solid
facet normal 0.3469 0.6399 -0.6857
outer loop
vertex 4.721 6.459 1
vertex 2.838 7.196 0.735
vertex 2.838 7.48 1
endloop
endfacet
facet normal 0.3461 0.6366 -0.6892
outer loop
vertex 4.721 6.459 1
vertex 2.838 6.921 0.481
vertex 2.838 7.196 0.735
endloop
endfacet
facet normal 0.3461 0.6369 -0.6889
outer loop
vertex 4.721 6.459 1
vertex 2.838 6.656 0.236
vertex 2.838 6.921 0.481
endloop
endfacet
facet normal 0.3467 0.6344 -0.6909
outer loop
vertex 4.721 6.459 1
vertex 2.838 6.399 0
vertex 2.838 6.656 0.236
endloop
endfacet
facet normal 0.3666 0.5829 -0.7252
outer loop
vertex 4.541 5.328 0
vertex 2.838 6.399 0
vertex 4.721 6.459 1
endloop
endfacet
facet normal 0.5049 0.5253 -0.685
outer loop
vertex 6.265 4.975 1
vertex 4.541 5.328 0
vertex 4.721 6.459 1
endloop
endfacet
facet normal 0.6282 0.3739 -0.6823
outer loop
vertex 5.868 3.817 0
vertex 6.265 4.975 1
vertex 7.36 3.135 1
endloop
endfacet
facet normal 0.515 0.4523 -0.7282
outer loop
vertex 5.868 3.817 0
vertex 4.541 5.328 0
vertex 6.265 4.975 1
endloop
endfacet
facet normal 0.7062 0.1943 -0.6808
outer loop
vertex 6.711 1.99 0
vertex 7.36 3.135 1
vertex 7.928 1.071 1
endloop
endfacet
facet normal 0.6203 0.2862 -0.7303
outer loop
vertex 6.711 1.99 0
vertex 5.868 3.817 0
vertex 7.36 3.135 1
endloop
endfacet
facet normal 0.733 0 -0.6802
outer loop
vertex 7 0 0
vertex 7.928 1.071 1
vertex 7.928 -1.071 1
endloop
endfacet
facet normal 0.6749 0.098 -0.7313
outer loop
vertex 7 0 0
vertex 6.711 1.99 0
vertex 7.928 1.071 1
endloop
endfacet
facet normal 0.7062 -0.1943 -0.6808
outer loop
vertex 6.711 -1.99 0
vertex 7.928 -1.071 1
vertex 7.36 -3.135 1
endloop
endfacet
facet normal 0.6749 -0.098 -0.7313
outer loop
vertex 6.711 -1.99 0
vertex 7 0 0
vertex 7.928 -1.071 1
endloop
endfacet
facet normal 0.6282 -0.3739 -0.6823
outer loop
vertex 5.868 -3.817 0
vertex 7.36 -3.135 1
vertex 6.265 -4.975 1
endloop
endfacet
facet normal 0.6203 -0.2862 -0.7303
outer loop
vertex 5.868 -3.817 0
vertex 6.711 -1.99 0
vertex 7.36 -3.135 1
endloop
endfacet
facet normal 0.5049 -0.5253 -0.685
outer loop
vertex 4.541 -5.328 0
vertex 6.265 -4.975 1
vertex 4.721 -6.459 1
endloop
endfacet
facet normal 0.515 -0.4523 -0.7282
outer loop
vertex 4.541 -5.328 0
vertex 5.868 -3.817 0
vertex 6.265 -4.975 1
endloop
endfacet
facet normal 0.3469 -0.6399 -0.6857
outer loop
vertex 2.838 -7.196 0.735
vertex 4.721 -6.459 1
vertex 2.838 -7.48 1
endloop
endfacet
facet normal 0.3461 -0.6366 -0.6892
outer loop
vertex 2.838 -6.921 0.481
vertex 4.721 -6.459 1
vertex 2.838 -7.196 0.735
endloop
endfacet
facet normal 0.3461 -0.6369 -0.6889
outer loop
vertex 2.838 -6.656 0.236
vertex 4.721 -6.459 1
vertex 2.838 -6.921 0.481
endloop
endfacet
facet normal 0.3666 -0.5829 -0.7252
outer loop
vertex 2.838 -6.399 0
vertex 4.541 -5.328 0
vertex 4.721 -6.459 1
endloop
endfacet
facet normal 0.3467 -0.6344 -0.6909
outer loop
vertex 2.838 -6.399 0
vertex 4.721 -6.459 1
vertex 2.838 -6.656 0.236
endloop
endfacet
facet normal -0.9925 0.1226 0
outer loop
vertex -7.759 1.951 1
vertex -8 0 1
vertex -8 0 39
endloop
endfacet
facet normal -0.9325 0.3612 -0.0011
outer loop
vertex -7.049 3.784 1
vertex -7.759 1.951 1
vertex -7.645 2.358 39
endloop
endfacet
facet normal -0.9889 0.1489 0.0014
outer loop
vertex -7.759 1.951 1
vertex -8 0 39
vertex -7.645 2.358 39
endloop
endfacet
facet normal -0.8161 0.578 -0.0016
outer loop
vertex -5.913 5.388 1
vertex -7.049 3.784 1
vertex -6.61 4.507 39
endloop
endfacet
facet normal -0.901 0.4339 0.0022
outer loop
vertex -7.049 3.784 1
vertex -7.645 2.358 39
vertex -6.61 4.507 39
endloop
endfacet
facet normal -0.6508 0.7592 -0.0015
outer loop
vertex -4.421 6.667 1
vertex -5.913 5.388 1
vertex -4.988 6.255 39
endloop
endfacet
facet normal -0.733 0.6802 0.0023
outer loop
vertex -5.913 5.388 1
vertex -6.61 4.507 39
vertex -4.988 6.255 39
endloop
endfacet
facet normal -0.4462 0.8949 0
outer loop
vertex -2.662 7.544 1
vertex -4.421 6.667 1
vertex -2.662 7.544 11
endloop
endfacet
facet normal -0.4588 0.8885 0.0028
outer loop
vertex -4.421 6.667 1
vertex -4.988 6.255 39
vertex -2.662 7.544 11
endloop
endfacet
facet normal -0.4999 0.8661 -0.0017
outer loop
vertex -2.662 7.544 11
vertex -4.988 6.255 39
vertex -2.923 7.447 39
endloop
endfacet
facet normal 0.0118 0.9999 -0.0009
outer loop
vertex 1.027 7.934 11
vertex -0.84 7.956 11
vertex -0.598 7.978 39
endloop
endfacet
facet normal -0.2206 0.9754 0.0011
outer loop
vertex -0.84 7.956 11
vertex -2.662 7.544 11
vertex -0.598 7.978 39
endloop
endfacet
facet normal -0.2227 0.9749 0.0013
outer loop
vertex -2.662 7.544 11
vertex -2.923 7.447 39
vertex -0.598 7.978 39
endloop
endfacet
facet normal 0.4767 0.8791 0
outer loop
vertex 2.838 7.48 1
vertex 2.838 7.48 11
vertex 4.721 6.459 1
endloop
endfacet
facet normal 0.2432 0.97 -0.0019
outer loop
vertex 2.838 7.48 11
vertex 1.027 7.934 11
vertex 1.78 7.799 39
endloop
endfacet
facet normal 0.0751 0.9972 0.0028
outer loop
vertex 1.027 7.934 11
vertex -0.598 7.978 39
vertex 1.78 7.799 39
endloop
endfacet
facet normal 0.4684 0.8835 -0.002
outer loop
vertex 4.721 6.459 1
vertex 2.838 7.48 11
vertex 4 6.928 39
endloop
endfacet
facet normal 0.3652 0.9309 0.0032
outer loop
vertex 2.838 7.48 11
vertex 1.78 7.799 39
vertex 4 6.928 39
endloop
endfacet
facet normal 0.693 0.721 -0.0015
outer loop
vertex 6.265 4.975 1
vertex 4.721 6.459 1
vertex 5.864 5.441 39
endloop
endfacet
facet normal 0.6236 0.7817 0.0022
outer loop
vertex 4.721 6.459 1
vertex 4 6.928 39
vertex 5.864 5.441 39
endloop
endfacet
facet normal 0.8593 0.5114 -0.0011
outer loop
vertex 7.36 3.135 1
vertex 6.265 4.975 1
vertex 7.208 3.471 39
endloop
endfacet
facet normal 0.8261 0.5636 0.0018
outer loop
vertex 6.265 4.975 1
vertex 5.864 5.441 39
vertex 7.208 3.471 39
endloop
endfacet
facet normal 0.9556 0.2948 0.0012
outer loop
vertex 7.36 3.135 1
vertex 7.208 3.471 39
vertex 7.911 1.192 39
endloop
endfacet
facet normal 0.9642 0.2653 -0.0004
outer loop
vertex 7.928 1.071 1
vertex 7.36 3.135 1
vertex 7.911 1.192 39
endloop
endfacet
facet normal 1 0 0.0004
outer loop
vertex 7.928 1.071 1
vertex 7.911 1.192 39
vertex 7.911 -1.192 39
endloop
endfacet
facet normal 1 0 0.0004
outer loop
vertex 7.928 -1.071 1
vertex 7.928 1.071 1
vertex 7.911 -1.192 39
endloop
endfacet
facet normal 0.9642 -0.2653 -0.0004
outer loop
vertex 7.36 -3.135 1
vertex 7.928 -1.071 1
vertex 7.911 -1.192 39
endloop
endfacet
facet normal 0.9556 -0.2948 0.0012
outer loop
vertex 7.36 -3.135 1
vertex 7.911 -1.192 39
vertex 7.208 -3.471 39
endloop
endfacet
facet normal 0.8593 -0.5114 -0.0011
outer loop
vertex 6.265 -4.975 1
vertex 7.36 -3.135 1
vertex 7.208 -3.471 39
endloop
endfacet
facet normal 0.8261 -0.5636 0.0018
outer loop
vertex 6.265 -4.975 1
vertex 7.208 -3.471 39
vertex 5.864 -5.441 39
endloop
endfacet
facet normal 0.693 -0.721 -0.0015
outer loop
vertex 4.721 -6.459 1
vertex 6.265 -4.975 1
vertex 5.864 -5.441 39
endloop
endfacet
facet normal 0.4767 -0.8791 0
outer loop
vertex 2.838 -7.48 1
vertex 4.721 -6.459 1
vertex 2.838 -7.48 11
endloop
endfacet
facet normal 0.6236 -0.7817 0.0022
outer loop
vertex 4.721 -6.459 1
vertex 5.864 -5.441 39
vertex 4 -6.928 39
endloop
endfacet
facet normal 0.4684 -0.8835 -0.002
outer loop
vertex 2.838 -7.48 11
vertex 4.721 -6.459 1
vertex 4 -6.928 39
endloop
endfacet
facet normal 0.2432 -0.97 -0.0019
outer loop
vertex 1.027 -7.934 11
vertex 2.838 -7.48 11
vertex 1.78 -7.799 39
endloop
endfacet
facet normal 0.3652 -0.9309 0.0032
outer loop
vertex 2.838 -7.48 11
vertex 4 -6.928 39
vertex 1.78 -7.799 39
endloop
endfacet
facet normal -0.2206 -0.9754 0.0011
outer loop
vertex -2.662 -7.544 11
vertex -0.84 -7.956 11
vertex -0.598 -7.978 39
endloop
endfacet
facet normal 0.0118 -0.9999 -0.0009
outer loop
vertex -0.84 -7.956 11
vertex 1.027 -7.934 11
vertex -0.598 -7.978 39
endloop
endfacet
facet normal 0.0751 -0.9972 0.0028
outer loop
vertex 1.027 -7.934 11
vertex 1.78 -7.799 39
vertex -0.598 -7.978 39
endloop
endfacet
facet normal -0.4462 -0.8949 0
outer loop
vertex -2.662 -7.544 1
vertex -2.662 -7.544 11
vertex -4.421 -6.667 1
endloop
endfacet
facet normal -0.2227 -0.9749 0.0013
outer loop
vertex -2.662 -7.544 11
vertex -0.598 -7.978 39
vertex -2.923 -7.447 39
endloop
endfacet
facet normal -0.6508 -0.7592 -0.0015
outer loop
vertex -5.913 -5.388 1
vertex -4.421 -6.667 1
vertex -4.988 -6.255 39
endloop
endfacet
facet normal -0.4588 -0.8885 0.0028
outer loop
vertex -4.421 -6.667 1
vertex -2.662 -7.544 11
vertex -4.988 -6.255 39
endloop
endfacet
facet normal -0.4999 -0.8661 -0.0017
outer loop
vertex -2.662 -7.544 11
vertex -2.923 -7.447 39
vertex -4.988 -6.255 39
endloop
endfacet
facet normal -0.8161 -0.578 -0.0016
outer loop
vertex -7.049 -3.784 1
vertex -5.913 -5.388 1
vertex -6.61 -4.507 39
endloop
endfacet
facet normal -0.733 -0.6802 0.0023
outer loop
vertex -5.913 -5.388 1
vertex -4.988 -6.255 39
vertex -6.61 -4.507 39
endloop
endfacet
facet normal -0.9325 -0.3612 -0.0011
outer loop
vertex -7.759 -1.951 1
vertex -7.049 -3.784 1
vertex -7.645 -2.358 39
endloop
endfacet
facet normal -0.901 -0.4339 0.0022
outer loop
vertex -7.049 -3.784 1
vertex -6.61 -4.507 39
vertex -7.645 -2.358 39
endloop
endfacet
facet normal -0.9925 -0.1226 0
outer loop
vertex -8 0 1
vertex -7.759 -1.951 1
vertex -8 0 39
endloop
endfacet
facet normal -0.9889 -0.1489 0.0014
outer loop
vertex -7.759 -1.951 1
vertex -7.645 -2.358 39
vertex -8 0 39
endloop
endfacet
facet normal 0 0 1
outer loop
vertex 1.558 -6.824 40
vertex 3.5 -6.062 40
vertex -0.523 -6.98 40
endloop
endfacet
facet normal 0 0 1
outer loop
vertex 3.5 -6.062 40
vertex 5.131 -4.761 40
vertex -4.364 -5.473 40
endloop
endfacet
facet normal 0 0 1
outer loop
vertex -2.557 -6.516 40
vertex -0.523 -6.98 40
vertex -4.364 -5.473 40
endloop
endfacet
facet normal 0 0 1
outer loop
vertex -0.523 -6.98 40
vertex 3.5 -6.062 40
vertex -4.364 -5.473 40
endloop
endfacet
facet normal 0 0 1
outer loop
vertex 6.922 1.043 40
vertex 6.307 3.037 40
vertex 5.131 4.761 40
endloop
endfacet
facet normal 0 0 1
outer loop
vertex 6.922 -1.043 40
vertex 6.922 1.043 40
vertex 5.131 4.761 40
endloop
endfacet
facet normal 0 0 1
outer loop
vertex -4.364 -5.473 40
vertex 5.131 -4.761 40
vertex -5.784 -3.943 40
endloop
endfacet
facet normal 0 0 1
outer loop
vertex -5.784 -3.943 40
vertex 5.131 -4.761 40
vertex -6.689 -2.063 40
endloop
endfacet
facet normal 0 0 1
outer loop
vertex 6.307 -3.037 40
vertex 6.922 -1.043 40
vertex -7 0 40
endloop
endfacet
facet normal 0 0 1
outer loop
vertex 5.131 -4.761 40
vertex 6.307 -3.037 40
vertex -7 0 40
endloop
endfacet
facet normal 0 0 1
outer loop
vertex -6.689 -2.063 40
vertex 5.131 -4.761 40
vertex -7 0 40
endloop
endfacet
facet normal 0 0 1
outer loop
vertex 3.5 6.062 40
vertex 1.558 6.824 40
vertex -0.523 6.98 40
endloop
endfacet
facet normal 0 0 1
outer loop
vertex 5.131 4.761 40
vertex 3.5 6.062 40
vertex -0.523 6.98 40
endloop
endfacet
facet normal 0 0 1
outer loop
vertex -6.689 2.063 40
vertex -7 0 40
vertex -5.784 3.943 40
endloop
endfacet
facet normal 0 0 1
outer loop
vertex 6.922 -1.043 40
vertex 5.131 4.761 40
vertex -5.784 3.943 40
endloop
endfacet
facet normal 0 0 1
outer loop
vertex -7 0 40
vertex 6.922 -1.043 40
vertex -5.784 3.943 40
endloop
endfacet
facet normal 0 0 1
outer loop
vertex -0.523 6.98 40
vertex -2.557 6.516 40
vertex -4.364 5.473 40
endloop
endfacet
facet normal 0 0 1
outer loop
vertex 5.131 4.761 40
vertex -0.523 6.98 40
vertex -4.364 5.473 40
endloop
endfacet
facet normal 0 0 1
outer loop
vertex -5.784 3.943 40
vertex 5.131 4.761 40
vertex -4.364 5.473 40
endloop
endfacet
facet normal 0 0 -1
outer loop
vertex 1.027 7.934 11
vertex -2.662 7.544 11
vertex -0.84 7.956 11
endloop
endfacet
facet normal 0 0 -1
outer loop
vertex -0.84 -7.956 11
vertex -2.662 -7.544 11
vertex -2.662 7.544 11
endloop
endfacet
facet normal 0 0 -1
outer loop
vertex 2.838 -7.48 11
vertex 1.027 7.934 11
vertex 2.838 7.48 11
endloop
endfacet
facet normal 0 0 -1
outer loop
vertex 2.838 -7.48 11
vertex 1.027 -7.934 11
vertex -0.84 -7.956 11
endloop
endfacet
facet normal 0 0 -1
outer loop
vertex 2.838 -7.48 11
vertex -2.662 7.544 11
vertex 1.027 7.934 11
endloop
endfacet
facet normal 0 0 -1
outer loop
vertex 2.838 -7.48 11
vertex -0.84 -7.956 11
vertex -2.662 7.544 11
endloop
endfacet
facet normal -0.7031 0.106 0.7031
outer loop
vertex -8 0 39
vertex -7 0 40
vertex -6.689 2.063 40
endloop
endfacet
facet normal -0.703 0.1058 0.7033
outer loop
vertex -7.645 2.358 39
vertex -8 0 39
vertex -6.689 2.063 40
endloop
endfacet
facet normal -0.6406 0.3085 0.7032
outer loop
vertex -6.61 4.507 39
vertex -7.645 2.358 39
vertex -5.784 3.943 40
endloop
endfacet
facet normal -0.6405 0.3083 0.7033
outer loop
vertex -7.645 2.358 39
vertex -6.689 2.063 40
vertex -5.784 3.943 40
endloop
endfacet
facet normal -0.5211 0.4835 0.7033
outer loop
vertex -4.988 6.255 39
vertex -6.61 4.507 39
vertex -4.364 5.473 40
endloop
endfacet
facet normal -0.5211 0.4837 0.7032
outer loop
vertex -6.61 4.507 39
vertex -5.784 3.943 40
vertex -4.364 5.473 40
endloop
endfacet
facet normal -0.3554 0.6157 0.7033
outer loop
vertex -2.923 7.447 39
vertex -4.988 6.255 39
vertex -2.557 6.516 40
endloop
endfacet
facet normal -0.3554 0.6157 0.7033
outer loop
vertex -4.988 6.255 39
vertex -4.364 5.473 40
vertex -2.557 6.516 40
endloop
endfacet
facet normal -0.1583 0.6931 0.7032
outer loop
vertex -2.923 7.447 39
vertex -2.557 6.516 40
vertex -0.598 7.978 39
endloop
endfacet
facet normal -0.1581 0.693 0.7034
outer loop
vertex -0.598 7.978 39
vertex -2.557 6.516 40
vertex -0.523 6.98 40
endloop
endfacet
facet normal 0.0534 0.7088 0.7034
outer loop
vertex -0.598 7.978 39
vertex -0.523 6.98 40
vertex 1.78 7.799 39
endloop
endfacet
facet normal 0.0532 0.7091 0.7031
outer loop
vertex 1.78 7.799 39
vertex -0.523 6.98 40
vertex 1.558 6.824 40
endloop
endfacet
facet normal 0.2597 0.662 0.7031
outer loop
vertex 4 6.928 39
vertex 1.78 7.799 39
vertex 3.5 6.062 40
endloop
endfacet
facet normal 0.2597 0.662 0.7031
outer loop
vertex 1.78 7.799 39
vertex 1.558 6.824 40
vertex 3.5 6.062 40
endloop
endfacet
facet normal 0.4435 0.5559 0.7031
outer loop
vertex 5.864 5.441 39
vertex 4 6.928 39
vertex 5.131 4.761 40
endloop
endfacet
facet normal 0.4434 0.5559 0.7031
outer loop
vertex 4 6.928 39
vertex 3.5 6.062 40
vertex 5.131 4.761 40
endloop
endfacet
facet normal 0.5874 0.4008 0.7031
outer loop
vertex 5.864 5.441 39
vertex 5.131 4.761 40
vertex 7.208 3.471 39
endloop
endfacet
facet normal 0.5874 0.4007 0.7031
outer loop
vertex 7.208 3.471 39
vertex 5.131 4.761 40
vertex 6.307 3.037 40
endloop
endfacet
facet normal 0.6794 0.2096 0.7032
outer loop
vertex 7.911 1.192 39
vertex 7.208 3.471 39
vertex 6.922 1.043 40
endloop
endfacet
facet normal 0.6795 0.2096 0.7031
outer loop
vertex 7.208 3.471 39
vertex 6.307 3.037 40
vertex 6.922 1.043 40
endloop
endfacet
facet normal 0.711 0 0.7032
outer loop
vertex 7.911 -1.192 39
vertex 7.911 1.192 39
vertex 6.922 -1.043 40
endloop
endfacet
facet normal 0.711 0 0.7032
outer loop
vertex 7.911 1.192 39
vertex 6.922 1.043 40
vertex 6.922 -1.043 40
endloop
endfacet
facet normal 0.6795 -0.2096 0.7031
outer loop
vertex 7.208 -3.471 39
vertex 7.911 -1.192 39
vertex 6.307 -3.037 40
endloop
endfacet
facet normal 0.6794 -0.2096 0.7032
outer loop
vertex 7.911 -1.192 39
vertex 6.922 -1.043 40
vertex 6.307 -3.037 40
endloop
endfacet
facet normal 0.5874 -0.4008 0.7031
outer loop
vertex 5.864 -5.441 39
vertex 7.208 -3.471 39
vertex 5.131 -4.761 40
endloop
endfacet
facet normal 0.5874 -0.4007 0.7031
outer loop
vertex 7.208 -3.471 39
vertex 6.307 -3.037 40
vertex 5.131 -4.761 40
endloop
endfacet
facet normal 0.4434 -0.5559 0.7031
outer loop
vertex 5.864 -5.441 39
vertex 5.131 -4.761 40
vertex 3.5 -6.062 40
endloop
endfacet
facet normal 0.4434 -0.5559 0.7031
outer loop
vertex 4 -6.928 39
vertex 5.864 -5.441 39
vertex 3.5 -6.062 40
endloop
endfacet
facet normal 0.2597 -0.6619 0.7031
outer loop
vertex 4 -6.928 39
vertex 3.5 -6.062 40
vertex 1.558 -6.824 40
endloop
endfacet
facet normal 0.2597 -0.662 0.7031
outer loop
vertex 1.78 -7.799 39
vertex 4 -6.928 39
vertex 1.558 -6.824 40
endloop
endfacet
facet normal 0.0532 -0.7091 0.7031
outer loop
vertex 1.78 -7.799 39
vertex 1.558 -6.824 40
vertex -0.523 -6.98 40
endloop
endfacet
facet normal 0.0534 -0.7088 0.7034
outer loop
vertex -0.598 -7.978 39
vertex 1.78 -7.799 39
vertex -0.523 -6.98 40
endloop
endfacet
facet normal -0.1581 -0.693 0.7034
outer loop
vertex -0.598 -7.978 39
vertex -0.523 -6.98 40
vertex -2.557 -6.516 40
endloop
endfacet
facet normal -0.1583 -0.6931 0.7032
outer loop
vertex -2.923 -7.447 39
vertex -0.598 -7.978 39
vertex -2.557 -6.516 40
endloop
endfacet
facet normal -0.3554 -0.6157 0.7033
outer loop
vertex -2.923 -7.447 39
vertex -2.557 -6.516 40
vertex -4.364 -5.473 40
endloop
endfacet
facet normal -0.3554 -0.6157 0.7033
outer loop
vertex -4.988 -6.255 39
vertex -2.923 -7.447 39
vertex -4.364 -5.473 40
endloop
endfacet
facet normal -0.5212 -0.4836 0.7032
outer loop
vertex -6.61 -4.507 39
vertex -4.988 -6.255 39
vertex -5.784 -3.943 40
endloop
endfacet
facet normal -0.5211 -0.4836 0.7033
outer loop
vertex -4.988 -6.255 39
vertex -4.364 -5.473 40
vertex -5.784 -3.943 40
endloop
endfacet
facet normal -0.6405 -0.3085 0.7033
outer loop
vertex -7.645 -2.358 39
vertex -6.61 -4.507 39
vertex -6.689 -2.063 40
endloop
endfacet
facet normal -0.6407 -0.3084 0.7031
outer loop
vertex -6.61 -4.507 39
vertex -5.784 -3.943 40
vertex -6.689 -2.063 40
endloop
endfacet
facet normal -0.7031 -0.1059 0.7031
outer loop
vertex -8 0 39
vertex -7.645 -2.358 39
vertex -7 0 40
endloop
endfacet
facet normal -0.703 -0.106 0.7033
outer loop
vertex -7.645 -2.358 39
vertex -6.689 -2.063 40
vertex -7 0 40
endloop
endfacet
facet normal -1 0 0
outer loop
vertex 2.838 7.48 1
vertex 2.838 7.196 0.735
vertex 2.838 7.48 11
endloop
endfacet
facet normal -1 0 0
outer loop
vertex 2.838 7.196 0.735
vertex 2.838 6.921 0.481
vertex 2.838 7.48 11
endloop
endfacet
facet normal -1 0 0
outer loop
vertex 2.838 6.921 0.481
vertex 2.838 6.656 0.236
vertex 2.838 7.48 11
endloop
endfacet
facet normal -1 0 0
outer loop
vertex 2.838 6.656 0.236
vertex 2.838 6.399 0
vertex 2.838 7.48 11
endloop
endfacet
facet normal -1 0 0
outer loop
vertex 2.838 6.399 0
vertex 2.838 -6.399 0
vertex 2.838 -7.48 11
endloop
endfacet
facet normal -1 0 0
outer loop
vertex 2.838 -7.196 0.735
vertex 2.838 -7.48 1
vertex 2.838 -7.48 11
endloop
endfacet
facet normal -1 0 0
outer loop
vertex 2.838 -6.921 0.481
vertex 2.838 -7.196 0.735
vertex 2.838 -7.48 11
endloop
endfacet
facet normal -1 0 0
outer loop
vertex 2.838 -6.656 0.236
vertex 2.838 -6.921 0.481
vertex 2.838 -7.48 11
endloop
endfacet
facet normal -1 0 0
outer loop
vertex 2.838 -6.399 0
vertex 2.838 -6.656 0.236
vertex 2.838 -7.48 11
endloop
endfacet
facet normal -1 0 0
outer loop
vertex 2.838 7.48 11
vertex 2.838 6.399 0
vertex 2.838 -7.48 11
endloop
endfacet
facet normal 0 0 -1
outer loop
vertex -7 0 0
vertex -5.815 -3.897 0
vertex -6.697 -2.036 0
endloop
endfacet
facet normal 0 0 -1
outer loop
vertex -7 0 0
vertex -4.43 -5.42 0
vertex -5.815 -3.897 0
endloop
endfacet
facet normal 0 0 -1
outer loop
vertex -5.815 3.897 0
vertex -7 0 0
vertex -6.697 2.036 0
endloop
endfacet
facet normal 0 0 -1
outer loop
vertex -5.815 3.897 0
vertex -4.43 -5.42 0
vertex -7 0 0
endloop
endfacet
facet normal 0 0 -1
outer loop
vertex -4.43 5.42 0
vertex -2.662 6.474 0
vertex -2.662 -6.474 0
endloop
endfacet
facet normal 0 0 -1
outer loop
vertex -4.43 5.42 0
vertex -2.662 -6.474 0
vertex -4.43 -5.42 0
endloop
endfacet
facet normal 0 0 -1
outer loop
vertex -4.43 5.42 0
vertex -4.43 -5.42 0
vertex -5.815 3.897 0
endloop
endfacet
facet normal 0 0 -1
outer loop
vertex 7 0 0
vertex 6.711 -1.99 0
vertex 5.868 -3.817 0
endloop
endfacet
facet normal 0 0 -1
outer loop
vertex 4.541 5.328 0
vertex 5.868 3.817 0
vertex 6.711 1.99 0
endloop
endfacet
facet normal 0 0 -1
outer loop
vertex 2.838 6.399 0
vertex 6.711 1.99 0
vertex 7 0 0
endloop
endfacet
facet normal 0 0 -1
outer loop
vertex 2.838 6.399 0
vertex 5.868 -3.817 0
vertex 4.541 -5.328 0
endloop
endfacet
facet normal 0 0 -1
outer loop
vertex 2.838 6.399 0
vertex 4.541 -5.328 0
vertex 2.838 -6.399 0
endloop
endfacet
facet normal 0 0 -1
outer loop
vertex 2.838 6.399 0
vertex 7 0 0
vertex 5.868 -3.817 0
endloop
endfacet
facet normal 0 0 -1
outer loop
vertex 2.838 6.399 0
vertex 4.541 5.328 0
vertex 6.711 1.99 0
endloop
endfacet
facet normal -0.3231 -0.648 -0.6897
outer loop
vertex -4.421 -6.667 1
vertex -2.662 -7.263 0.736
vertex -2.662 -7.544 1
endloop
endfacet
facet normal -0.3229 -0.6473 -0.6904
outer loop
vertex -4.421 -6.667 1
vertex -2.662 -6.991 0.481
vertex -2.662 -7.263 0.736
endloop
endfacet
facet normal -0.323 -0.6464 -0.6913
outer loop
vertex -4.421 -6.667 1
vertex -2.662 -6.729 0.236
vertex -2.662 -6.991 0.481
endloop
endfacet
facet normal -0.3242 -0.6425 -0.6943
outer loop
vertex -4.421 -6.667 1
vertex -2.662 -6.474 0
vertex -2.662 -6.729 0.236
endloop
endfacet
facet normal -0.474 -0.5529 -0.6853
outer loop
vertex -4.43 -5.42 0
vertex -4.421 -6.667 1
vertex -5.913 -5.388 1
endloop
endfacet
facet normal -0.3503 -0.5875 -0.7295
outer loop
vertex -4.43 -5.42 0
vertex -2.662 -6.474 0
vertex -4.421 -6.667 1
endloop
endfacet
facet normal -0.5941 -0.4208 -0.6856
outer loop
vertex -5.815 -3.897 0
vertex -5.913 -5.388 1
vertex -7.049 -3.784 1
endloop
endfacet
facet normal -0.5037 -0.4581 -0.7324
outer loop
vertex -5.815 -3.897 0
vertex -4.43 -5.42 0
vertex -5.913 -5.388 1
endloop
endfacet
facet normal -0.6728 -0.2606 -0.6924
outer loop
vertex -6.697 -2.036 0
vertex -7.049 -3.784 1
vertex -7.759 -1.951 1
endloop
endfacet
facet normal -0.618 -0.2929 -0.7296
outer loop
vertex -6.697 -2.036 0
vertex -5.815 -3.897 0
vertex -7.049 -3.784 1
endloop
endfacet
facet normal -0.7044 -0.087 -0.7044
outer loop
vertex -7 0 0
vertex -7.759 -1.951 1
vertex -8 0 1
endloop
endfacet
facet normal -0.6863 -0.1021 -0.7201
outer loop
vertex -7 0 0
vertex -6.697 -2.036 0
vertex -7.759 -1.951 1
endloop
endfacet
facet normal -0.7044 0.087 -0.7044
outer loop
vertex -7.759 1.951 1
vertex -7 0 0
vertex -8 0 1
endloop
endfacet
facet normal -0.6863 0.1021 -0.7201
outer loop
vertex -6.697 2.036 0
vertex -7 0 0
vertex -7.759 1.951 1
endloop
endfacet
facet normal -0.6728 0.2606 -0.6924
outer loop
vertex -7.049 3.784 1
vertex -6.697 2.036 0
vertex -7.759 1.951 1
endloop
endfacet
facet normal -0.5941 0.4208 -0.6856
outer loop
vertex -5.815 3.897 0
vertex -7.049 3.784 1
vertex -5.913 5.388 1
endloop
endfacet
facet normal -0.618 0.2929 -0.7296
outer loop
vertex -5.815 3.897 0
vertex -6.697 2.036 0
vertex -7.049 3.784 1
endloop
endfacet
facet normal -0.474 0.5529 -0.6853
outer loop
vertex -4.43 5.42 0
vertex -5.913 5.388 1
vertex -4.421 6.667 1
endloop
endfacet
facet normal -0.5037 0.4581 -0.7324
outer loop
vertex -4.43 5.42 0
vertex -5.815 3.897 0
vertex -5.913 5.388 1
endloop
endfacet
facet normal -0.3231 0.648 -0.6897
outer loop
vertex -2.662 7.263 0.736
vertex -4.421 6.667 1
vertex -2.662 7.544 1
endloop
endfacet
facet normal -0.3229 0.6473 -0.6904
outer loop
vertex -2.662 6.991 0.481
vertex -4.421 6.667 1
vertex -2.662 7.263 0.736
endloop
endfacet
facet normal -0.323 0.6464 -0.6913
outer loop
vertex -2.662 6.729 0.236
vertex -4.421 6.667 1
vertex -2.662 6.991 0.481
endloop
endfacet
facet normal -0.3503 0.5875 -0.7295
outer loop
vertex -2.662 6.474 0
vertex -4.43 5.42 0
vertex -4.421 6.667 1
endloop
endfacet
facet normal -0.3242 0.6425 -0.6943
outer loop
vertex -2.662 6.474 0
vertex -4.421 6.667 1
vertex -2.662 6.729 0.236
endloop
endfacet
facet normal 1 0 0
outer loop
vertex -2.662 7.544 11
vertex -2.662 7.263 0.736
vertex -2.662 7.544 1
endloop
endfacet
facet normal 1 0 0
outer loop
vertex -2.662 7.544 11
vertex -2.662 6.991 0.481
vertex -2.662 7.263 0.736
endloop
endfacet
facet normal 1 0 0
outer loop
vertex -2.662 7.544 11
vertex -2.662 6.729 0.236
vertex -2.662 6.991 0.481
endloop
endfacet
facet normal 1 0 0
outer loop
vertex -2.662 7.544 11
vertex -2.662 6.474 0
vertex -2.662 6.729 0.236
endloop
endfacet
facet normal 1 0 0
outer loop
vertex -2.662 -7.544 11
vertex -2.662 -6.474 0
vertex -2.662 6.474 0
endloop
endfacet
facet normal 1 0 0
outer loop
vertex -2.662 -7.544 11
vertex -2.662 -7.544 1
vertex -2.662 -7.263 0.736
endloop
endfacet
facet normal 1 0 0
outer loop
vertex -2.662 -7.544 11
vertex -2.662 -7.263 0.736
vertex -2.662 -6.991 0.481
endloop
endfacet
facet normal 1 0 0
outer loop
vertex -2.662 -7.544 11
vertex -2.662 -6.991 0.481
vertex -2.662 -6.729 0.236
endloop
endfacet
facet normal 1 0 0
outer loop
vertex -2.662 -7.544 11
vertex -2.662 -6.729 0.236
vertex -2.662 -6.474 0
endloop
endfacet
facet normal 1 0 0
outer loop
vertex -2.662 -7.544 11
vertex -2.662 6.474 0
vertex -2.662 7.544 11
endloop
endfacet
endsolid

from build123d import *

# Parameters (mm, degrees)
F0_W     = 8
F0_H     = 40
F2_W     = 5.5
F2_H     = 11
F3_DEPTH = 12.5
F4_SIZE  = 1


with BuildPart() as f1:
    # F0 (on Front) → F1 (revolve)
    with BuildSketch(Plane.XZ):
        with Locations((-4, 20)):
            Rectangle(F0_W, F0_H)
    revolve(axis=Axis((0, 0, 20), (0, 0, -1)))

    # F2 (on Front) → F3 (cut, symmetric)
    with BuildSketch(Plane.XZ):
        with Locations((0.0883303039, 5.5)):
            Rectangle(F2_W, F2_H)
    extrude(amount=F3_DEPTH, both=True, mode=Mode.SUBTRACT)

    # F4
    f4_edges = [f1.edges().sort_by_distance(p)[0] for p in [
        (8, 0, 40),
        (8, 0, 0),
        (-6.530442, 4.620965, 0),
        (-6.530442, -4.620965, 0),
    ]]
    chamfer(f4_edges, length=F4_SIZE)


solid = f1.part
